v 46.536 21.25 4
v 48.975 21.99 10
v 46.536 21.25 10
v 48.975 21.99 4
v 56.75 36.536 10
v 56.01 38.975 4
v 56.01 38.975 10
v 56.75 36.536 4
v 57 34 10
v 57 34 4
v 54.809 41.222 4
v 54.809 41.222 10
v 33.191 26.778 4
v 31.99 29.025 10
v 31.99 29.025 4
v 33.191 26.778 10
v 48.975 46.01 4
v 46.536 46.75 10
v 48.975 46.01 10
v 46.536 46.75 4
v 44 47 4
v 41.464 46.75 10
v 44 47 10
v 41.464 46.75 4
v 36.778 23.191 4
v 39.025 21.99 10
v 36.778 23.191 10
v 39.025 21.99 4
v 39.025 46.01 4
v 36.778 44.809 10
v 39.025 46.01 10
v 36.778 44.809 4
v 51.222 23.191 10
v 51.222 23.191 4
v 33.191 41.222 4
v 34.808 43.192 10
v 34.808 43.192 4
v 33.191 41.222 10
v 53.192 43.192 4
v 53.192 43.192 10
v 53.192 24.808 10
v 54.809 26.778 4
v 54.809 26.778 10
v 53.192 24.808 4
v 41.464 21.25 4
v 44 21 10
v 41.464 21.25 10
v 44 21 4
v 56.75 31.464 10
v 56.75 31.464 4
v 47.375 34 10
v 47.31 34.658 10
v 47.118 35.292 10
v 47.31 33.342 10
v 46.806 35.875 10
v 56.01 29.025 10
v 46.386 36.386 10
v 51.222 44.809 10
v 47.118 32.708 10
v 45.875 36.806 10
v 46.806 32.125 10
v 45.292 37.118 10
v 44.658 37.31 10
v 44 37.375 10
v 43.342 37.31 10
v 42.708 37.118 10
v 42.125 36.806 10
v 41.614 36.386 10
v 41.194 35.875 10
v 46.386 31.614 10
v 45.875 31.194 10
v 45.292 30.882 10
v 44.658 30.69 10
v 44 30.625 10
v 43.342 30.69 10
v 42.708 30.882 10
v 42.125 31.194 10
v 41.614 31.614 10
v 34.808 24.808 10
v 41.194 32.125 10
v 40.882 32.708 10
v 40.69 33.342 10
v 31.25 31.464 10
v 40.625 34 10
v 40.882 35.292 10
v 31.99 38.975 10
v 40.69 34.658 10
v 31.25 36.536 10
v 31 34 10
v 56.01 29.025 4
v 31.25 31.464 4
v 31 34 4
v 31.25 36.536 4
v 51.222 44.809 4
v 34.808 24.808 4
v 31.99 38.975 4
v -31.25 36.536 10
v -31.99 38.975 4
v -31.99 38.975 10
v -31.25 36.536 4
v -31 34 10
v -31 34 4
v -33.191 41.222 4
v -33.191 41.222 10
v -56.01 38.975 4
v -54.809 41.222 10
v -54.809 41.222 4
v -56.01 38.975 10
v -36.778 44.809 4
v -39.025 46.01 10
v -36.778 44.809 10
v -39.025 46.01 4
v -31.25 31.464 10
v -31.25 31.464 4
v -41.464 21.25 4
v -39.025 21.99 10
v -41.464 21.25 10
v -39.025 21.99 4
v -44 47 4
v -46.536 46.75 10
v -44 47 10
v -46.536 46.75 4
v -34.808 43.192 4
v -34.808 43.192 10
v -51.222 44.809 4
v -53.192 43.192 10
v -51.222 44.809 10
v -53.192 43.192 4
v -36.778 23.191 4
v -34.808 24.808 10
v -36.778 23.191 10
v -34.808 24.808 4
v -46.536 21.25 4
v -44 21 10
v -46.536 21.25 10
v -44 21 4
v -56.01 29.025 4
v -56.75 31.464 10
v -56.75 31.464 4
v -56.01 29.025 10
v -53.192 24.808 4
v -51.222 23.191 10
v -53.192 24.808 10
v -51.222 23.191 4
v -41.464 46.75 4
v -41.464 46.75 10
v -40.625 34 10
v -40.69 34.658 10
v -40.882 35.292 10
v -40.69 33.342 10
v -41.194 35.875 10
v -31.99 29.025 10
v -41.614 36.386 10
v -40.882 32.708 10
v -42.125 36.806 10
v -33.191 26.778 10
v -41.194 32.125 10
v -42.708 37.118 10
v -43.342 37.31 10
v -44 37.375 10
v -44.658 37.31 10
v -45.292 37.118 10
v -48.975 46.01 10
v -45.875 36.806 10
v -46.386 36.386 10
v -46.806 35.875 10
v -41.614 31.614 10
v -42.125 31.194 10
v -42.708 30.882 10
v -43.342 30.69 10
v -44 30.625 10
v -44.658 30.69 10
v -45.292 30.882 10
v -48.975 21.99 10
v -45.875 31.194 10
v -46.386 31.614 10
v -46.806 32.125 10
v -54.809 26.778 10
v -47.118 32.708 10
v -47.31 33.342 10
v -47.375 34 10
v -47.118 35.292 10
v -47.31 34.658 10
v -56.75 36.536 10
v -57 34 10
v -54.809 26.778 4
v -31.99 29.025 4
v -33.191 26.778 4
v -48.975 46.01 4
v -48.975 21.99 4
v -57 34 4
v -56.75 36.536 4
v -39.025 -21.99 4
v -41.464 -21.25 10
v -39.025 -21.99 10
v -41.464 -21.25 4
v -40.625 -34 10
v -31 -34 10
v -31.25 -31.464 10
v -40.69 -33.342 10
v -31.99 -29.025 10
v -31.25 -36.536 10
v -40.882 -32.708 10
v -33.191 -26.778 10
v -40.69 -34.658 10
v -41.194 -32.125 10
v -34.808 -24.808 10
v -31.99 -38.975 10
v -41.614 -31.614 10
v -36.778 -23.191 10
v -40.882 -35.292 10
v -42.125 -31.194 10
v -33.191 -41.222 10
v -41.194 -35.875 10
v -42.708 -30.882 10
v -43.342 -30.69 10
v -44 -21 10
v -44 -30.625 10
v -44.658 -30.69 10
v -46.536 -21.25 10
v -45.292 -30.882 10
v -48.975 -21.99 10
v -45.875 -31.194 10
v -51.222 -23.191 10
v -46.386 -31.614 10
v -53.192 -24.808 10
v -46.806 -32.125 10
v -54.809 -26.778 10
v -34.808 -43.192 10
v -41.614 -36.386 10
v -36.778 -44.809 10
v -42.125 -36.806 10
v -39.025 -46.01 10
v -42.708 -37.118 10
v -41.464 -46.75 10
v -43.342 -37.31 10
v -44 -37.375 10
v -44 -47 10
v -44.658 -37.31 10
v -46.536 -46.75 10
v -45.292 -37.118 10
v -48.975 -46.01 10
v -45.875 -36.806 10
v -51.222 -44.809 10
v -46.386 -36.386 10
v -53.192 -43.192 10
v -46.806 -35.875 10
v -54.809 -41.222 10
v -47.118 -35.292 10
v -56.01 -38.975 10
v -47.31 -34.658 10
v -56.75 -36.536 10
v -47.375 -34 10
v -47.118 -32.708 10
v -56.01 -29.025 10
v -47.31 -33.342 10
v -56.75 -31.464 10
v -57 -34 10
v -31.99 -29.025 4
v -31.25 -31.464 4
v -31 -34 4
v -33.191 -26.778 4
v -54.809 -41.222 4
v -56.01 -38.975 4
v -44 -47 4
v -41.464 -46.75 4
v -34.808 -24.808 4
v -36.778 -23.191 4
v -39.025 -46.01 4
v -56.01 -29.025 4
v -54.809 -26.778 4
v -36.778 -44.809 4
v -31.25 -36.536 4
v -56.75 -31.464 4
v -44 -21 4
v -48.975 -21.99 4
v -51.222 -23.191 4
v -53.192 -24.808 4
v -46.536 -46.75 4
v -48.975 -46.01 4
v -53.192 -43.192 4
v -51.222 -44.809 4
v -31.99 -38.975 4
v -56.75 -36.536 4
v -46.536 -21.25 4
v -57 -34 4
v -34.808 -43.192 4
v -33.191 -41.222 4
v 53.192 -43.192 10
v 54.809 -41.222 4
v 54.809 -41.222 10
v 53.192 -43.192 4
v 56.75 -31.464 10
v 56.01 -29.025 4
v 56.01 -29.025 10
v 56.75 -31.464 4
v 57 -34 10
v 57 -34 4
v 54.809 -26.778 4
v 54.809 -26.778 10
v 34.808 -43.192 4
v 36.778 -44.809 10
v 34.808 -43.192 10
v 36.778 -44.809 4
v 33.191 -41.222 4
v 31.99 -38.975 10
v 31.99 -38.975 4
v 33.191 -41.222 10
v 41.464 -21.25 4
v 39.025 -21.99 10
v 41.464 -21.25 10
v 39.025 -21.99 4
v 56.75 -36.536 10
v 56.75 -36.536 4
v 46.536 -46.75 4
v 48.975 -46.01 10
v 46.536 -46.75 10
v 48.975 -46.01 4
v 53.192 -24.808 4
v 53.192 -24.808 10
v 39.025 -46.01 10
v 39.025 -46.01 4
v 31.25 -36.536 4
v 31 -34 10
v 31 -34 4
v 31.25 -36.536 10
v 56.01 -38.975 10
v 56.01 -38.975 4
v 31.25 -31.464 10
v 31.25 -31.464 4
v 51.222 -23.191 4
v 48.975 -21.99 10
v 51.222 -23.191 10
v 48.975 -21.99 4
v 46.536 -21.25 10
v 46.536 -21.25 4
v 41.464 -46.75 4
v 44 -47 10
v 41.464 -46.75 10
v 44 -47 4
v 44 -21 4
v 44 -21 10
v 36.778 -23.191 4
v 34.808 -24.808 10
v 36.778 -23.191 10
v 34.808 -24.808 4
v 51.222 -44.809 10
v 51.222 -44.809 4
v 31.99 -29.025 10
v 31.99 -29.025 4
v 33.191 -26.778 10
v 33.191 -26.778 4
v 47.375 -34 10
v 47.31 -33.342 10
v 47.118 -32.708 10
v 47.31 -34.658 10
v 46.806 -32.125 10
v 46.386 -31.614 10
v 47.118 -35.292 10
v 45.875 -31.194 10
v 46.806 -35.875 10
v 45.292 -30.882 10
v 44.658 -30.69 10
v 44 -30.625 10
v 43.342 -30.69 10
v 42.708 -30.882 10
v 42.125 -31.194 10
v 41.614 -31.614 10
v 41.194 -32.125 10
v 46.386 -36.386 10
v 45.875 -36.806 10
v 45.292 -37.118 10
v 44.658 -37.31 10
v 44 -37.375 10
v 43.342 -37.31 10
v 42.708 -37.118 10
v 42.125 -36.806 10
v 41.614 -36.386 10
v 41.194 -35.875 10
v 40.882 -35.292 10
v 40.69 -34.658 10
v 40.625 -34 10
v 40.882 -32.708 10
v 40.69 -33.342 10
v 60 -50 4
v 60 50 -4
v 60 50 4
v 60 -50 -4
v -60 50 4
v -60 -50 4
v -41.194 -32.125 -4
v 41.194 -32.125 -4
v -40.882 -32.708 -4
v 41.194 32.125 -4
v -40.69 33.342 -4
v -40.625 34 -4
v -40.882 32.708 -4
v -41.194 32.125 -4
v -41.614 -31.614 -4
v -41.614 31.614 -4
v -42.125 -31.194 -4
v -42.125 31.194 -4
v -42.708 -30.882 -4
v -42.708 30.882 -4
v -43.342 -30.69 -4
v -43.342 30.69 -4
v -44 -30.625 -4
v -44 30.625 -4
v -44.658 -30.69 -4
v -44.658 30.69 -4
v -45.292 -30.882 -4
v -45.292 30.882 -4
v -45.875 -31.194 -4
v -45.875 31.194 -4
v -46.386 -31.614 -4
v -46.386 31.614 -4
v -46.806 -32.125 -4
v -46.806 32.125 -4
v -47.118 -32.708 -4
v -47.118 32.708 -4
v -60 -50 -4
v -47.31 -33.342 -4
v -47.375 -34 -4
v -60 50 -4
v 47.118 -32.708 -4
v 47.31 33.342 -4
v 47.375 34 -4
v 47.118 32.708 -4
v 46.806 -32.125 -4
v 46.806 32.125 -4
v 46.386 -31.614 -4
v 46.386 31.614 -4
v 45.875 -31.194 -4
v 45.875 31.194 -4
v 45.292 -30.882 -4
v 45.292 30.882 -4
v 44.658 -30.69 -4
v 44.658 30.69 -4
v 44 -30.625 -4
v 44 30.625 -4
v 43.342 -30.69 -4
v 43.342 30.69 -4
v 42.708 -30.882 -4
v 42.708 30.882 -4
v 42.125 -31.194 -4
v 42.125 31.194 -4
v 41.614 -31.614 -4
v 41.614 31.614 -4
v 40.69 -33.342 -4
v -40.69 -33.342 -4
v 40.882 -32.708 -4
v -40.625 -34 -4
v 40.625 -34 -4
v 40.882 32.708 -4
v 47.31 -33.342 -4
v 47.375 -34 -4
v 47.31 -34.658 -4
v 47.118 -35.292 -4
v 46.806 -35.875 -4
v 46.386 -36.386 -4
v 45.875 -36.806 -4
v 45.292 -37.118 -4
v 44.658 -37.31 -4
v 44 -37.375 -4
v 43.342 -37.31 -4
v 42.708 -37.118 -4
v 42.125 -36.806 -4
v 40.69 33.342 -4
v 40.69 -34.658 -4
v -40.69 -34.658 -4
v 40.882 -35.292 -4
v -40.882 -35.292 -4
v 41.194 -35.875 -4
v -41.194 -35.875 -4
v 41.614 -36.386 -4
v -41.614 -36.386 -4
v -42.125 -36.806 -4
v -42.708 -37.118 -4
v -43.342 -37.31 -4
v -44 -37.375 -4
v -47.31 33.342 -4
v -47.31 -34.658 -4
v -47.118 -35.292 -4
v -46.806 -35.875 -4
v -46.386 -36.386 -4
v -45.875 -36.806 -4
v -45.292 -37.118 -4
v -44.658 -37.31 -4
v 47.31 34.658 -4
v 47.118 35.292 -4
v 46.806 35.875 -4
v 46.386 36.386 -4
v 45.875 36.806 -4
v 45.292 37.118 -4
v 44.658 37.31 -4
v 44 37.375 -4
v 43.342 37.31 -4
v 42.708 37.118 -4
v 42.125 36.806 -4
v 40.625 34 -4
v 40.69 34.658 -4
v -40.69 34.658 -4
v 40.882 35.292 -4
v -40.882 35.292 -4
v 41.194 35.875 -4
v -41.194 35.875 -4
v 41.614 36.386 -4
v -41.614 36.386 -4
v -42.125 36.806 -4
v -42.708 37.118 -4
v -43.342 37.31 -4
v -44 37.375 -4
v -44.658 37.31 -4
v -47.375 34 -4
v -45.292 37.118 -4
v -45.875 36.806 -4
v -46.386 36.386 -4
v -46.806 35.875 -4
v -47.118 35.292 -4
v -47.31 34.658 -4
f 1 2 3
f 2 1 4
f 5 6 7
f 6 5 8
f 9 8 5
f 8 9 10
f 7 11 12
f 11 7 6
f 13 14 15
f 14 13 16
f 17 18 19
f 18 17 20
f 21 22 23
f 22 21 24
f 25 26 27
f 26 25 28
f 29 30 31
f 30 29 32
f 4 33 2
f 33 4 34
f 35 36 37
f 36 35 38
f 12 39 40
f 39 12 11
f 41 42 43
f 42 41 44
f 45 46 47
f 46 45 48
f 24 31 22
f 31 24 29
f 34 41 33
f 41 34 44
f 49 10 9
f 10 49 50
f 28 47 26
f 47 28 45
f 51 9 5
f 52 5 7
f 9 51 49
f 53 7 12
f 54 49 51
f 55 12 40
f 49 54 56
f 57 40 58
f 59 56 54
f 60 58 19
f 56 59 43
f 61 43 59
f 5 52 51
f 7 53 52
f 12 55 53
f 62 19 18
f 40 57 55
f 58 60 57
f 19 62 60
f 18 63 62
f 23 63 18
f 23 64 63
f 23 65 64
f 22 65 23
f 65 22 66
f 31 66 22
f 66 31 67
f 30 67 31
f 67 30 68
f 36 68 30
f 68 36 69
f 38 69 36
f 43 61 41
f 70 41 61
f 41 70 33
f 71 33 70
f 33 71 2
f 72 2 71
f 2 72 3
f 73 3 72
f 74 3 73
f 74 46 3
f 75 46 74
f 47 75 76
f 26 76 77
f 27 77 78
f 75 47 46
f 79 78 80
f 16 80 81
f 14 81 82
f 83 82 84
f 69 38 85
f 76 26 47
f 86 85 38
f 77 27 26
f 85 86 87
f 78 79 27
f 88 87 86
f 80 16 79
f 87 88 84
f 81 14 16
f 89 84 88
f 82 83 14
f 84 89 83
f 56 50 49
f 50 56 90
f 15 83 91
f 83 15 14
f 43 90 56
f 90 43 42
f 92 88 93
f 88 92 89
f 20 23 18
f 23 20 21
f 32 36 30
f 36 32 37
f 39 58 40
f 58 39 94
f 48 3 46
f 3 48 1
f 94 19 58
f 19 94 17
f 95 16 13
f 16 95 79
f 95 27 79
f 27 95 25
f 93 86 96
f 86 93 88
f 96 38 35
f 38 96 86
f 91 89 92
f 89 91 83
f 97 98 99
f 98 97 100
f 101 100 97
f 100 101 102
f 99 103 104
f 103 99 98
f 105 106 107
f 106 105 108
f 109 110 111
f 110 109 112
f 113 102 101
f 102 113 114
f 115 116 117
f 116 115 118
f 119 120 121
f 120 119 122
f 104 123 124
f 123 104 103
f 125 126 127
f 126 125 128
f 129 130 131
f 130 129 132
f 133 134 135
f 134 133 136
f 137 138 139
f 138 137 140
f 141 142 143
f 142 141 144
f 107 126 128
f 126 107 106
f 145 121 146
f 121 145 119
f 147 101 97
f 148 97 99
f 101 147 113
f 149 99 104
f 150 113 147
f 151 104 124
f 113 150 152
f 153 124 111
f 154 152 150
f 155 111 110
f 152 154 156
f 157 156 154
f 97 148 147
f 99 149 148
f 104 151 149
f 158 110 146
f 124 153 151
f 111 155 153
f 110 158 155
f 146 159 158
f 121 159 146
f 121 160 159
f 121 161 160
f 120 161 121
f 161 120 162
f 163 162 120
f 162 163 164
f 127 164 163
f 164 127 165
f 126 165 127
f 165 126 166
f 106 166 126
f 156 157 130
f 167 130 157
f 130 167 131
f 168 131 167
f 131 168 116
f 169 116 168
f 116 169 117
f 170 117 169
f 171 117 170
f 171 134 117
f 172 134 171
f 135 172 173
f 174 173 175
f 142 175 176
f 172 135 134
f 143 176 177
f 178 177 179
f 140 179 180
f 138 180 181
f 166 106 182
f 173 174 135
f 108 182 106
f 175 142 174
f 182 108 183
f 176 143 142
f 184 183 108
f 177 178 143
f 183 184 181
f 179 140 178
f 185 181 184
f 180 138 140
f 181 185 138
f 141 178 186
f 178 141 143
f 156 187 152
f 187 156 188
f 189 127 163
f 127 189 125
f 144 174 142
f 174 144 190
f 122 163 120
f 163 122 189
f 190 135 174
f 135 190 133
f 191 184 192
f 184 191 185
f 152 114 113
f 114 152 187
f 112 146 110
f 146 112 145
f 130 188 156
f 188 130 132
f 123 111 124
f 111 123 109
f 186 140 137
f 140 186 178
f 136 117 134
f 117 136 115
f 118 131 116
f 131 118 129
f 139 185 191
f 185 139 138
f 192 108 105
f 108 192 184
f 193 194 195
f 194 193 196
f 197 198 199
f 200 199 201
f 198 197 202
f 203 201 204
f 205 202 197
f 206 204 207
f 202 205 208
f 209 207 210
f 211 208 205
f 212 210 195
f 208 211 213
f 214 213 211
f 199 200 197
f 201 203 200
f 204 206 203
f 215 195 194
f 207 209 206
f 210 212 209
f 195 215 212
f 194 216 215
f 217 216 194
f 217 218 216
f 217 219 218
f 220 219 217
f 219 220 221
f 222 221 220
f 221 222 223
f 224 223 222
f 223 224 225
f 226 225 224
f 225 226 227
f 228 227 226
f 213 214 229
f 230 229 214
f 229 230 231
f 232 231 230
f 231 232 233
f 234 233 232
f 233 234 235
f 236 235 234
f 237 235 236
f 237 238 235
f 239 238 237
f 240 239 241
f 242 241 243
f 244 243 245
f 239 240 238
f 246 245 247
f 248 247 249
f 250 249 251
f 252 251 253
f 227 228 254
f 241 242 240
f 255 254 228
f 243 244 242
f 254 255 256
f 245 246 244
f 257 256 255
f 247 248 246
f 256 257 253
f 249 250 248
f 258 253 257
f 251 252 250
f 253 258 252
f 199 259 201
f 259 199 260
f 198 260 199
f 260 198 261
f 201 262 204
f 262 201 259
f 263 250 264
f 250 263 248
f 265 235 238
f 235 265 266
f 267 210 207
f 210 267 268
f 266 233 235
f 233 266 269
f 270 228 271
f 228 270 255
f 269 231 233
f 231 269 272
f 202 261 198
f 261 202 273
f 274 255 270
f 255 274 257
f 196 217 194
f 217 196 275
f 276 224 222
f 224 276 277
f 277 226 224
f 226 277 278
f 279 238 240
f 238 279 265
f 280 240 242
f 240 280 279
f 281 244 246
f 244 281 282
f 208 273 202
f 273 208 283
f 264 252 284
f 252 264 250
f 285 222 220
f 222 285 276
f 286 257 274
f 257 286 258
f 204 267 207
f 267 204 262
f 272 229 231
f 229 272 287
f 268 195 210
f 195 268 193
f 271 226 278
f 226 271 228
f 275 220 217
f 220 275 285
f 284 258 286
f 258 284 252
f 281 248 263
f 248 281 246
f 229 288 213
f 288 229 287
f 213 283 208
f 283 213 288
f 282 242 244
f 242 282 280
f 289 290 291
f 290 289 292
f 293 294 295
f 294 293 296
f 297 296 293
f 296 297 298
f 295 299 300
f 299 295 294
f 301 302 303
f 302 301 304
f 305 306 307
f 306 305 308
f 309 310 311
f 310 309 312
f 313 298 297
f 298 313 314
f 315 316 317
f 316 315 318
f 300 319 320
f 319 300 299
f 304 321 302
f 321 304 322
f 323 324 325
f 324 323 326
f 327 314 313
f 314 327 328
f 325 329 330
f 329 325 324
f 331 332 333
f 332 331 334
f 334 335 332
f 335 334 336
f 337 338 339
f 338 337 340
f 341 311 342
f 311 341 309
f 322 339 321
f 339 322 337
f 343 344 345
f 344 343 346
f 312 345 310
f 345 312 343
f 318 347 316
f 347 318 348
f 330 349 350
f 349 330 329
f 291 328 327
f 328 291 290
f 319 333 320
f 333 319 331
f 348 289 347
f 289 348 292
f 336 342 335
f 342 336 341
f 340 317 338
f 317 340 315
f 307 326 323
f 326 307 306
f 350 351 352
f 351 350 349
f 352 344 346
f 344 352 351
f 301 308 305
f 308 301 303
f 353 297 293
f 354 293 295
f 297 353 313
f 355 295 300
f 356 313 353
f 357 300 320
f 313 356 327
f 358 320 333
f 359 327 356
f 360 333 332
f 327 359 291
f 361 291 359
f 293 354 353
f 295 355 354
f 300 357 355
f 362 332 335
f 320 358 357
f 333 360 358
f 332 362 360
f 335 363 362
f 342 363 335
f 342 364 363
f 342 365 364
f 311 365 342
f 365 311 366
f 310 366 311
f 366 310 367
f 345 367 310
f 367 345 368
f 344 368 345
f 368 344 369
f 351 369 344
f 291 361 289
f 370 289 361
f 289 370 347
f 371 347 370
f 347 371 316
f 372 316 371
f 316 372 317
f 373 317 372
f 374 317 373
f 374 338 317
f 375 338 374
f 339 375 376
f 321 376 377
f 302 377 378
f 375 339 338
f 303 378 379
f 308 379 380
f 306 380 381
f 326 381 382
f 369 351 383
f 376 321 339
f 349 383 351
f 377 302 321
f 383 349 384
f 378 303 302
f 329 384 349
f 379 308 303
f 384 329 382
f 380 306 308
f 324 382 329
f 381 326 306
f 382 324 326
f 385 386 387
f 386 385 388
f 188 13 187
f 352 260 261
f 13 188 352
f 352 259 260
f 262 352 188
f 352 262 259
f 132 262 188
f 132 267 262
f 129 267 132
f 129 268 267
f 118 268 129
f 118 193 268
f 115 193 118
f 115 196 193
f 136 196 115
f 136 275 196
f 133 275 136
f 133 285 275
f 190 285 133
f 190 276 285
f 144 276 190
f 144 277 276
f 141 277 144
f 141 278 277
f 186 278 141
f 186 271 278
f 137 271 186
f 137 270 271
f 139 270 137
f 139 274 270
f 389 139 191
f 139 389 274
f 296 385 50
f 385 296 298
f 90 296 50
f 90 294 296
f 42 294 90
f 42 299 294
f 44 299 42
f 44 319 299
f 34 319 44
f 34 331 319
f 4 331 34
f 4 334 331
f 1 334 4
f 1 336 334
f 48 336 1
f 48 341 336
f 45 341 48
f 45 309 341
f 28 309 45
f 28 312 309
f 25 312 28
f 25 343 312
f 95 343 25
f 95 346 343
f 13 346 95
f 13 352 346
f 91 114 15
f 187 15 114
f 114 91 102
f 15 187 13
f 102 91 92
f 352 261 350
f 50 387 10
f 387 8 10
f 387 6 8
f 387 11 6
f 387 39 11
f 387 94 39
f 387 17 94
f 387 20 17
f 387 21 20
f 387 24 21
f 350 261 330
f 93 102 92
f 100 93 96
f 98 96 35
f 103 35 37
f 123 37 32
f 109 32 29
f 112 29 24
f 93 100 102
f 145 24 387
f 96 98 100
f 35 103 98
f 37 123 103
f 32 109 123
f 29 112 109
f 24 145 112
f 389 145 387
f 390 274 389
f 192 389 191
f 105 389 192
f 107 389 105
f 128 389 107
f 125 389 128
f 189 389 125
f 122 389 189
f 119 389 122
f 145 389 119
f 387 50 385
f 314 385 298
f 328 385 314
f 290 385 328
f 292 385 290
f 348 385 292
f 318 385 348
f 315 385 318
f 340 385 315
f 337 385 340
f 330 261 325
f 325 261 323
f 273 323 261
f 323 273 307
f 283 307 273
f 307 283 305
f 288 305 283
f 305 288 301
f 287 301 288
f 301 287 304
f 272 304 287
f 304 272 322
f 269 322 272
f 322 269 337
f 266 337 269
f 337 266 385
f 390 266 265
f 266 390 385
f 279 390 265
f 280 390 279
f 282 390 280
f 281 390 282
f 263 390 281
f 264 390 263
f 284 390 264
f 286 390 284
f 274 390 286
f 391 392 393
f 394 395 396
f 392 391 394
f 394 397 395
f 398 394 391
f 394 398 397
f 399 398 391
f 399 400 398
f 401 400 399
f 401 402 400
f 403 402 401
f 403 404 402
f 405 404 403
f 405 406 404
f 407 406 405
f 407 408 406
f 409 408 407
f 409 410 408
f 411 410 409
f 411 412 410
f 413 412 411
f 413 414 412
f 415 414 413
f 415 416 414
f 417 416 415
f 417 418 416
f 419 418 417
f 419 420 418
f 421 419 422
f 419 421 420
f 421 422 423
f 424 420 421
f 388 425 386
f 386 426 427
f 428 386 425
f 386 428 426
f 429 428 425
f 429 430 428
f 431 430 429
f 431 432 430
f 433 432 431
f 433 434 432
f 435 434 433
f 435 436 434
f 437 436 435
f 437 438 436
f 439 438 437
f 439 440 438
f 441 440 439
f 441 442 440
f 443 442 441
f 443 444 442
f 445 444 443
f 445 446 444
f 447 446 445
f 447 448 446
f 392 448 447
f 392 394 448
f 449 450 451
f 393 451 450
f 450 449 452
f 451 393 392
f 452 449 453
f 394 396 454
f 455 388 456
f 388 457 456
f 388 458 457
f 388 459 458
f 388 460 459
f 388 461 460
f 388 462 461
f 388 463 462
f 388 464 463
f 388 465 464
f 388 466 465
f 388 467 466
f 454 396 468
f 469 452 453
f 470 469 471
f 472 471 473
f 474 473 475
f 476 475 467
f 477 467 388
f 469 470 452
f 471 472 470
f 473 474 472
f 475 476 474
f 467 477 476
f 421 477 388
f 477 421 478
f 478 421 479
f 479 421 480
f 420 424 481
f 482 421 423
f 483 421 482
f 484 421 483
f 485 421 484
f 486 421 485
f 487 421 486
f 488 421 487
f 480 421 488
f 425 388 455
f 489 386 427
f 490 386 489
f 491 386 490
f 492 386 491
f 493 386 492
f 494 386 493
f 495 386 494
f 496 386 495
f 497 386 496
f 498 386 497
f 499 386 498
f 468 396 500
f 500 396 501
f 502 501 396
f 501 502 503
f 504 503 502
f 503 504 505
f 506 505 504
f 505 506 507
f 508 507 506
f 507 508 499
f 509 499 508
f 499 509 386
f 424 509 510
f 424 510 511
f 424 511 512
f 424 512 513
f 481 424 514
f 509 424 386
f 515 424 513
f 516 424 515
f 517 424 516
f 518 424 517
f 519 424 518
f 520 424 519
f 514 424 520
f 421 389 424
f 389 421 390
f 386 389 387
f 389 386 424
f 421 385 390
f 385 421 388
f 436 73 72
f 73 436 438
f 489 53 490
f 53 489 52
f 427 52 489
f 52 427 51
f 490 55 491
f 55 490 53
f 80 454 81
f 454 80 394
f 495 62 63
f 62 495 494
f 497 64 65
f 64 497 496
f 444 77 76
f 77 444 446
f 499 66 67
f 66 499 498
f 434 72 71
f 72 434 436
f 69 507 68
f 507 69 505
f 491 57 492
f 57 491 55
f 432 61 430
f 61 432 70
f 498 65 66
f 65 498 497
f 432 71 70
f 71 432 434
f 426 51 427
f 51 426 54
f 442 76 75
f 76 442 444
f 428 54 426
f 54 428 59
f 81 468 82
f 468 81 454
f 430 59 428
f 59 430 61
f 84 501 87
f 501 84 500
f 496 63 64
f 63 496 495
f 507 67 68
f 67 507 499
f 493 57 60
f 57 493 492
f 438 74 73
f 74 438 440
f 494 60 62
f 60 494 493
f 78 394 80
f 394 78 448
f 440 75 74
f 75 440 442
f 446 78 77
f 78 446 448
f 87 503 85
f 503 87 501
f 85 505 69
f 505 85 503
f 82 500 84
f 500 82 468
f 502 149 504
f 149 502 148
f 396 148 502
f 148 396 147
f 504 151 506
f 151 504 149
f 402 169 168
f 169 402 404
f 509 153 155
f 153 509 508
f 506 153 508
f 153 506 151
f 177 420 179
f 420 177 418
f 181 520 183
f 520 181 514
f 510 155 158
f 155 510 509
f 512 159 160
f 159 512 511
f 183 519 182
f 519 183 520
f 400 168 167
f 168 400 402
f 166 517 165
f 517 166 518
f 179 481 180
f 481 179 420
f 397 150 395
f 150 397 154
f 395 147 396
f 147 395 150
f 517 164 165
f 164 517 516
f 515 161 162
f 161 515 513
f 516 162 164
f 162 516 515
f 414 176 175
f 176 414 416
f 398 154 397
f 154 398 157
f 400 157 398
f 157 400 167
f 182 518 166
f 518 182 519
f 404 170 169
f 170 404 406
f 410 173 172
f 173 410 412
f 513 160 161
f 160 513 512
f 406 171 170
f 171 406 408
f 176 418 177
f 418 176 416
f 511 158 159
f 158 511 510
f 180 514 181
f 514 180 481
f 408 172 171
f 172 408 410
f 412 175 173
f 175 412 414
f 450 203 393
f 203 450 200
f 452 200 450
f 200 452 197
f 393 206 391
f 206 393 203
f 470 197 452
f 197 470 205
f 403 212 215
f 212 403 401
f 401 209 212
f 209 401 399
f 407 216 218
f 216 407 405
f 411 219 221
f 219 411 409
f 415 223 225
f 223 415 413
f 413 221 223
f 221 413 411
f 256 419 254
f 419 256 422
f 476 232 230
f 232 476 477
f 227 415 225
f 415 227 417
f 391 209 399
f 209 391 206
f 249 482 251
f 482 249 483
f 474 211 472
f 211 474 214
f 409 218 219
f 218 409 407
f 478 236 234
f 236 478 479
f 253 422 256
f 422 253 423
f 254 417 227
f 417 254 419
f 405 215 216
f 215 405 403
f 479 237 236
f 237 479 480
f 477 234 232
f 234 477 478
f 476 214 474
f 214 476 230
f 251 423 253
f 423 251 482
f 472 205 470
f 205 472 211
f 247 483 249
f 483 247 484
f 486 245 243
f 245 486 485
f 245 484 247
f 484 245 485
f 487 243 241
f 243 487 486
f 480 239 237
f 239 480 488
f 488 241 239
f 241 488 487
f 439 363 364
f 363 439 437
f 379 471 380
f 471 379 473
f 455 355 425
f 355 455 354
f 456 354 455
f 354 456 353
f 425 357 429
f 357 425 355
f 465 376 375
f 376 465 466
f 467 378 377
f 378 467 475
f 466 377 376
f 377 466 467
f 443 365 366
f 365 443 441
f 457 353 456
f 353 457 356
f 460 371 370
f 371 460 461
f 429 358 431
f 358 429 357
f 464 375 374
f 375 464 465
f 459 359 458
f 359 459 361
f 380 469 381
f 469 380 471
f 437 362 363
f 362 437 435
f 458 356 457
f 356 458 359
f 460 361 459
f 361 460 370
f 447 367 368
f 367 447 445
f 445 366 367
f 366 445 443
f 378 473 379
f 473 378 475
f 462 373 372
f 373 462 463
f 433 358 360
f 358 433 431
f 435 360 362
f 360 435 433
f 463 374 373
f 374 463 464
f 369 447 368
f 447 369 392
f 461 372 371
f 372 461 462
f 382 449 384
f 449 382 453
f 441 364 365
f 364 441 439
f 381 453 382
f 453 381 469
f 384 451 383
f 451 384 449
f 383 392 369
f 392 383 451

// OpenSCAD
$fn = 32;

// ----------------------------------------------------------------------
// Anchor pads 120 x 100 x 14
// four corner bosses with anchor holes
// ----------------------------------------------------------------------

// --- parameters (mm) ---
plate = [120, 100, 8];   // base plate size (x, y, z)
pads = 4;                // boss count, one per corner
edge = 16;               // boss centre offset from the plate edge
boss_d = 26;             // boss diameter
boss_h = 6;              // boss height above the base plate
bore_d = 6.6;            // nominal hole diameter from the drawing
print_allowance = 0.15;  // clearance added for printing

// --- derived feature positions (mm) ---
hole_d = bore_d + print_allowance;  // = 6.75   hole diameter as printed
height = plate[2] + boss_h;         // = 14   overall height of the part
corner_x = plate[0] / 2 - edge;     // = 44   boss centre X
corner_y = plate[1] / 2 - edge;     // = 34   boss centre Y
feature_centers = [
  [corner_x, corner_y],
  [-corner_x, corner_y],
  [-corner_x, -corner_y],
  [corner_x, -corner_y]
];   // boss centres, anchor holes are drilled there

// base plate, four bosses standing on it, anchor holes all the way through
difference() {
  union() {
    cube(plate, center = true);
    for (centre = feature_centers)
      translate([centre[0], centre[1], plate[2] / 2 - 1])
        cylinder(d = boss_d, h = boss_h + 1);
  }
  for (centre = feature_centers)
    translate([centre[0], centre[1], -height])
      cylinder(d = hole_d, h = 2 * height + 2);  // through boss and plate
}
